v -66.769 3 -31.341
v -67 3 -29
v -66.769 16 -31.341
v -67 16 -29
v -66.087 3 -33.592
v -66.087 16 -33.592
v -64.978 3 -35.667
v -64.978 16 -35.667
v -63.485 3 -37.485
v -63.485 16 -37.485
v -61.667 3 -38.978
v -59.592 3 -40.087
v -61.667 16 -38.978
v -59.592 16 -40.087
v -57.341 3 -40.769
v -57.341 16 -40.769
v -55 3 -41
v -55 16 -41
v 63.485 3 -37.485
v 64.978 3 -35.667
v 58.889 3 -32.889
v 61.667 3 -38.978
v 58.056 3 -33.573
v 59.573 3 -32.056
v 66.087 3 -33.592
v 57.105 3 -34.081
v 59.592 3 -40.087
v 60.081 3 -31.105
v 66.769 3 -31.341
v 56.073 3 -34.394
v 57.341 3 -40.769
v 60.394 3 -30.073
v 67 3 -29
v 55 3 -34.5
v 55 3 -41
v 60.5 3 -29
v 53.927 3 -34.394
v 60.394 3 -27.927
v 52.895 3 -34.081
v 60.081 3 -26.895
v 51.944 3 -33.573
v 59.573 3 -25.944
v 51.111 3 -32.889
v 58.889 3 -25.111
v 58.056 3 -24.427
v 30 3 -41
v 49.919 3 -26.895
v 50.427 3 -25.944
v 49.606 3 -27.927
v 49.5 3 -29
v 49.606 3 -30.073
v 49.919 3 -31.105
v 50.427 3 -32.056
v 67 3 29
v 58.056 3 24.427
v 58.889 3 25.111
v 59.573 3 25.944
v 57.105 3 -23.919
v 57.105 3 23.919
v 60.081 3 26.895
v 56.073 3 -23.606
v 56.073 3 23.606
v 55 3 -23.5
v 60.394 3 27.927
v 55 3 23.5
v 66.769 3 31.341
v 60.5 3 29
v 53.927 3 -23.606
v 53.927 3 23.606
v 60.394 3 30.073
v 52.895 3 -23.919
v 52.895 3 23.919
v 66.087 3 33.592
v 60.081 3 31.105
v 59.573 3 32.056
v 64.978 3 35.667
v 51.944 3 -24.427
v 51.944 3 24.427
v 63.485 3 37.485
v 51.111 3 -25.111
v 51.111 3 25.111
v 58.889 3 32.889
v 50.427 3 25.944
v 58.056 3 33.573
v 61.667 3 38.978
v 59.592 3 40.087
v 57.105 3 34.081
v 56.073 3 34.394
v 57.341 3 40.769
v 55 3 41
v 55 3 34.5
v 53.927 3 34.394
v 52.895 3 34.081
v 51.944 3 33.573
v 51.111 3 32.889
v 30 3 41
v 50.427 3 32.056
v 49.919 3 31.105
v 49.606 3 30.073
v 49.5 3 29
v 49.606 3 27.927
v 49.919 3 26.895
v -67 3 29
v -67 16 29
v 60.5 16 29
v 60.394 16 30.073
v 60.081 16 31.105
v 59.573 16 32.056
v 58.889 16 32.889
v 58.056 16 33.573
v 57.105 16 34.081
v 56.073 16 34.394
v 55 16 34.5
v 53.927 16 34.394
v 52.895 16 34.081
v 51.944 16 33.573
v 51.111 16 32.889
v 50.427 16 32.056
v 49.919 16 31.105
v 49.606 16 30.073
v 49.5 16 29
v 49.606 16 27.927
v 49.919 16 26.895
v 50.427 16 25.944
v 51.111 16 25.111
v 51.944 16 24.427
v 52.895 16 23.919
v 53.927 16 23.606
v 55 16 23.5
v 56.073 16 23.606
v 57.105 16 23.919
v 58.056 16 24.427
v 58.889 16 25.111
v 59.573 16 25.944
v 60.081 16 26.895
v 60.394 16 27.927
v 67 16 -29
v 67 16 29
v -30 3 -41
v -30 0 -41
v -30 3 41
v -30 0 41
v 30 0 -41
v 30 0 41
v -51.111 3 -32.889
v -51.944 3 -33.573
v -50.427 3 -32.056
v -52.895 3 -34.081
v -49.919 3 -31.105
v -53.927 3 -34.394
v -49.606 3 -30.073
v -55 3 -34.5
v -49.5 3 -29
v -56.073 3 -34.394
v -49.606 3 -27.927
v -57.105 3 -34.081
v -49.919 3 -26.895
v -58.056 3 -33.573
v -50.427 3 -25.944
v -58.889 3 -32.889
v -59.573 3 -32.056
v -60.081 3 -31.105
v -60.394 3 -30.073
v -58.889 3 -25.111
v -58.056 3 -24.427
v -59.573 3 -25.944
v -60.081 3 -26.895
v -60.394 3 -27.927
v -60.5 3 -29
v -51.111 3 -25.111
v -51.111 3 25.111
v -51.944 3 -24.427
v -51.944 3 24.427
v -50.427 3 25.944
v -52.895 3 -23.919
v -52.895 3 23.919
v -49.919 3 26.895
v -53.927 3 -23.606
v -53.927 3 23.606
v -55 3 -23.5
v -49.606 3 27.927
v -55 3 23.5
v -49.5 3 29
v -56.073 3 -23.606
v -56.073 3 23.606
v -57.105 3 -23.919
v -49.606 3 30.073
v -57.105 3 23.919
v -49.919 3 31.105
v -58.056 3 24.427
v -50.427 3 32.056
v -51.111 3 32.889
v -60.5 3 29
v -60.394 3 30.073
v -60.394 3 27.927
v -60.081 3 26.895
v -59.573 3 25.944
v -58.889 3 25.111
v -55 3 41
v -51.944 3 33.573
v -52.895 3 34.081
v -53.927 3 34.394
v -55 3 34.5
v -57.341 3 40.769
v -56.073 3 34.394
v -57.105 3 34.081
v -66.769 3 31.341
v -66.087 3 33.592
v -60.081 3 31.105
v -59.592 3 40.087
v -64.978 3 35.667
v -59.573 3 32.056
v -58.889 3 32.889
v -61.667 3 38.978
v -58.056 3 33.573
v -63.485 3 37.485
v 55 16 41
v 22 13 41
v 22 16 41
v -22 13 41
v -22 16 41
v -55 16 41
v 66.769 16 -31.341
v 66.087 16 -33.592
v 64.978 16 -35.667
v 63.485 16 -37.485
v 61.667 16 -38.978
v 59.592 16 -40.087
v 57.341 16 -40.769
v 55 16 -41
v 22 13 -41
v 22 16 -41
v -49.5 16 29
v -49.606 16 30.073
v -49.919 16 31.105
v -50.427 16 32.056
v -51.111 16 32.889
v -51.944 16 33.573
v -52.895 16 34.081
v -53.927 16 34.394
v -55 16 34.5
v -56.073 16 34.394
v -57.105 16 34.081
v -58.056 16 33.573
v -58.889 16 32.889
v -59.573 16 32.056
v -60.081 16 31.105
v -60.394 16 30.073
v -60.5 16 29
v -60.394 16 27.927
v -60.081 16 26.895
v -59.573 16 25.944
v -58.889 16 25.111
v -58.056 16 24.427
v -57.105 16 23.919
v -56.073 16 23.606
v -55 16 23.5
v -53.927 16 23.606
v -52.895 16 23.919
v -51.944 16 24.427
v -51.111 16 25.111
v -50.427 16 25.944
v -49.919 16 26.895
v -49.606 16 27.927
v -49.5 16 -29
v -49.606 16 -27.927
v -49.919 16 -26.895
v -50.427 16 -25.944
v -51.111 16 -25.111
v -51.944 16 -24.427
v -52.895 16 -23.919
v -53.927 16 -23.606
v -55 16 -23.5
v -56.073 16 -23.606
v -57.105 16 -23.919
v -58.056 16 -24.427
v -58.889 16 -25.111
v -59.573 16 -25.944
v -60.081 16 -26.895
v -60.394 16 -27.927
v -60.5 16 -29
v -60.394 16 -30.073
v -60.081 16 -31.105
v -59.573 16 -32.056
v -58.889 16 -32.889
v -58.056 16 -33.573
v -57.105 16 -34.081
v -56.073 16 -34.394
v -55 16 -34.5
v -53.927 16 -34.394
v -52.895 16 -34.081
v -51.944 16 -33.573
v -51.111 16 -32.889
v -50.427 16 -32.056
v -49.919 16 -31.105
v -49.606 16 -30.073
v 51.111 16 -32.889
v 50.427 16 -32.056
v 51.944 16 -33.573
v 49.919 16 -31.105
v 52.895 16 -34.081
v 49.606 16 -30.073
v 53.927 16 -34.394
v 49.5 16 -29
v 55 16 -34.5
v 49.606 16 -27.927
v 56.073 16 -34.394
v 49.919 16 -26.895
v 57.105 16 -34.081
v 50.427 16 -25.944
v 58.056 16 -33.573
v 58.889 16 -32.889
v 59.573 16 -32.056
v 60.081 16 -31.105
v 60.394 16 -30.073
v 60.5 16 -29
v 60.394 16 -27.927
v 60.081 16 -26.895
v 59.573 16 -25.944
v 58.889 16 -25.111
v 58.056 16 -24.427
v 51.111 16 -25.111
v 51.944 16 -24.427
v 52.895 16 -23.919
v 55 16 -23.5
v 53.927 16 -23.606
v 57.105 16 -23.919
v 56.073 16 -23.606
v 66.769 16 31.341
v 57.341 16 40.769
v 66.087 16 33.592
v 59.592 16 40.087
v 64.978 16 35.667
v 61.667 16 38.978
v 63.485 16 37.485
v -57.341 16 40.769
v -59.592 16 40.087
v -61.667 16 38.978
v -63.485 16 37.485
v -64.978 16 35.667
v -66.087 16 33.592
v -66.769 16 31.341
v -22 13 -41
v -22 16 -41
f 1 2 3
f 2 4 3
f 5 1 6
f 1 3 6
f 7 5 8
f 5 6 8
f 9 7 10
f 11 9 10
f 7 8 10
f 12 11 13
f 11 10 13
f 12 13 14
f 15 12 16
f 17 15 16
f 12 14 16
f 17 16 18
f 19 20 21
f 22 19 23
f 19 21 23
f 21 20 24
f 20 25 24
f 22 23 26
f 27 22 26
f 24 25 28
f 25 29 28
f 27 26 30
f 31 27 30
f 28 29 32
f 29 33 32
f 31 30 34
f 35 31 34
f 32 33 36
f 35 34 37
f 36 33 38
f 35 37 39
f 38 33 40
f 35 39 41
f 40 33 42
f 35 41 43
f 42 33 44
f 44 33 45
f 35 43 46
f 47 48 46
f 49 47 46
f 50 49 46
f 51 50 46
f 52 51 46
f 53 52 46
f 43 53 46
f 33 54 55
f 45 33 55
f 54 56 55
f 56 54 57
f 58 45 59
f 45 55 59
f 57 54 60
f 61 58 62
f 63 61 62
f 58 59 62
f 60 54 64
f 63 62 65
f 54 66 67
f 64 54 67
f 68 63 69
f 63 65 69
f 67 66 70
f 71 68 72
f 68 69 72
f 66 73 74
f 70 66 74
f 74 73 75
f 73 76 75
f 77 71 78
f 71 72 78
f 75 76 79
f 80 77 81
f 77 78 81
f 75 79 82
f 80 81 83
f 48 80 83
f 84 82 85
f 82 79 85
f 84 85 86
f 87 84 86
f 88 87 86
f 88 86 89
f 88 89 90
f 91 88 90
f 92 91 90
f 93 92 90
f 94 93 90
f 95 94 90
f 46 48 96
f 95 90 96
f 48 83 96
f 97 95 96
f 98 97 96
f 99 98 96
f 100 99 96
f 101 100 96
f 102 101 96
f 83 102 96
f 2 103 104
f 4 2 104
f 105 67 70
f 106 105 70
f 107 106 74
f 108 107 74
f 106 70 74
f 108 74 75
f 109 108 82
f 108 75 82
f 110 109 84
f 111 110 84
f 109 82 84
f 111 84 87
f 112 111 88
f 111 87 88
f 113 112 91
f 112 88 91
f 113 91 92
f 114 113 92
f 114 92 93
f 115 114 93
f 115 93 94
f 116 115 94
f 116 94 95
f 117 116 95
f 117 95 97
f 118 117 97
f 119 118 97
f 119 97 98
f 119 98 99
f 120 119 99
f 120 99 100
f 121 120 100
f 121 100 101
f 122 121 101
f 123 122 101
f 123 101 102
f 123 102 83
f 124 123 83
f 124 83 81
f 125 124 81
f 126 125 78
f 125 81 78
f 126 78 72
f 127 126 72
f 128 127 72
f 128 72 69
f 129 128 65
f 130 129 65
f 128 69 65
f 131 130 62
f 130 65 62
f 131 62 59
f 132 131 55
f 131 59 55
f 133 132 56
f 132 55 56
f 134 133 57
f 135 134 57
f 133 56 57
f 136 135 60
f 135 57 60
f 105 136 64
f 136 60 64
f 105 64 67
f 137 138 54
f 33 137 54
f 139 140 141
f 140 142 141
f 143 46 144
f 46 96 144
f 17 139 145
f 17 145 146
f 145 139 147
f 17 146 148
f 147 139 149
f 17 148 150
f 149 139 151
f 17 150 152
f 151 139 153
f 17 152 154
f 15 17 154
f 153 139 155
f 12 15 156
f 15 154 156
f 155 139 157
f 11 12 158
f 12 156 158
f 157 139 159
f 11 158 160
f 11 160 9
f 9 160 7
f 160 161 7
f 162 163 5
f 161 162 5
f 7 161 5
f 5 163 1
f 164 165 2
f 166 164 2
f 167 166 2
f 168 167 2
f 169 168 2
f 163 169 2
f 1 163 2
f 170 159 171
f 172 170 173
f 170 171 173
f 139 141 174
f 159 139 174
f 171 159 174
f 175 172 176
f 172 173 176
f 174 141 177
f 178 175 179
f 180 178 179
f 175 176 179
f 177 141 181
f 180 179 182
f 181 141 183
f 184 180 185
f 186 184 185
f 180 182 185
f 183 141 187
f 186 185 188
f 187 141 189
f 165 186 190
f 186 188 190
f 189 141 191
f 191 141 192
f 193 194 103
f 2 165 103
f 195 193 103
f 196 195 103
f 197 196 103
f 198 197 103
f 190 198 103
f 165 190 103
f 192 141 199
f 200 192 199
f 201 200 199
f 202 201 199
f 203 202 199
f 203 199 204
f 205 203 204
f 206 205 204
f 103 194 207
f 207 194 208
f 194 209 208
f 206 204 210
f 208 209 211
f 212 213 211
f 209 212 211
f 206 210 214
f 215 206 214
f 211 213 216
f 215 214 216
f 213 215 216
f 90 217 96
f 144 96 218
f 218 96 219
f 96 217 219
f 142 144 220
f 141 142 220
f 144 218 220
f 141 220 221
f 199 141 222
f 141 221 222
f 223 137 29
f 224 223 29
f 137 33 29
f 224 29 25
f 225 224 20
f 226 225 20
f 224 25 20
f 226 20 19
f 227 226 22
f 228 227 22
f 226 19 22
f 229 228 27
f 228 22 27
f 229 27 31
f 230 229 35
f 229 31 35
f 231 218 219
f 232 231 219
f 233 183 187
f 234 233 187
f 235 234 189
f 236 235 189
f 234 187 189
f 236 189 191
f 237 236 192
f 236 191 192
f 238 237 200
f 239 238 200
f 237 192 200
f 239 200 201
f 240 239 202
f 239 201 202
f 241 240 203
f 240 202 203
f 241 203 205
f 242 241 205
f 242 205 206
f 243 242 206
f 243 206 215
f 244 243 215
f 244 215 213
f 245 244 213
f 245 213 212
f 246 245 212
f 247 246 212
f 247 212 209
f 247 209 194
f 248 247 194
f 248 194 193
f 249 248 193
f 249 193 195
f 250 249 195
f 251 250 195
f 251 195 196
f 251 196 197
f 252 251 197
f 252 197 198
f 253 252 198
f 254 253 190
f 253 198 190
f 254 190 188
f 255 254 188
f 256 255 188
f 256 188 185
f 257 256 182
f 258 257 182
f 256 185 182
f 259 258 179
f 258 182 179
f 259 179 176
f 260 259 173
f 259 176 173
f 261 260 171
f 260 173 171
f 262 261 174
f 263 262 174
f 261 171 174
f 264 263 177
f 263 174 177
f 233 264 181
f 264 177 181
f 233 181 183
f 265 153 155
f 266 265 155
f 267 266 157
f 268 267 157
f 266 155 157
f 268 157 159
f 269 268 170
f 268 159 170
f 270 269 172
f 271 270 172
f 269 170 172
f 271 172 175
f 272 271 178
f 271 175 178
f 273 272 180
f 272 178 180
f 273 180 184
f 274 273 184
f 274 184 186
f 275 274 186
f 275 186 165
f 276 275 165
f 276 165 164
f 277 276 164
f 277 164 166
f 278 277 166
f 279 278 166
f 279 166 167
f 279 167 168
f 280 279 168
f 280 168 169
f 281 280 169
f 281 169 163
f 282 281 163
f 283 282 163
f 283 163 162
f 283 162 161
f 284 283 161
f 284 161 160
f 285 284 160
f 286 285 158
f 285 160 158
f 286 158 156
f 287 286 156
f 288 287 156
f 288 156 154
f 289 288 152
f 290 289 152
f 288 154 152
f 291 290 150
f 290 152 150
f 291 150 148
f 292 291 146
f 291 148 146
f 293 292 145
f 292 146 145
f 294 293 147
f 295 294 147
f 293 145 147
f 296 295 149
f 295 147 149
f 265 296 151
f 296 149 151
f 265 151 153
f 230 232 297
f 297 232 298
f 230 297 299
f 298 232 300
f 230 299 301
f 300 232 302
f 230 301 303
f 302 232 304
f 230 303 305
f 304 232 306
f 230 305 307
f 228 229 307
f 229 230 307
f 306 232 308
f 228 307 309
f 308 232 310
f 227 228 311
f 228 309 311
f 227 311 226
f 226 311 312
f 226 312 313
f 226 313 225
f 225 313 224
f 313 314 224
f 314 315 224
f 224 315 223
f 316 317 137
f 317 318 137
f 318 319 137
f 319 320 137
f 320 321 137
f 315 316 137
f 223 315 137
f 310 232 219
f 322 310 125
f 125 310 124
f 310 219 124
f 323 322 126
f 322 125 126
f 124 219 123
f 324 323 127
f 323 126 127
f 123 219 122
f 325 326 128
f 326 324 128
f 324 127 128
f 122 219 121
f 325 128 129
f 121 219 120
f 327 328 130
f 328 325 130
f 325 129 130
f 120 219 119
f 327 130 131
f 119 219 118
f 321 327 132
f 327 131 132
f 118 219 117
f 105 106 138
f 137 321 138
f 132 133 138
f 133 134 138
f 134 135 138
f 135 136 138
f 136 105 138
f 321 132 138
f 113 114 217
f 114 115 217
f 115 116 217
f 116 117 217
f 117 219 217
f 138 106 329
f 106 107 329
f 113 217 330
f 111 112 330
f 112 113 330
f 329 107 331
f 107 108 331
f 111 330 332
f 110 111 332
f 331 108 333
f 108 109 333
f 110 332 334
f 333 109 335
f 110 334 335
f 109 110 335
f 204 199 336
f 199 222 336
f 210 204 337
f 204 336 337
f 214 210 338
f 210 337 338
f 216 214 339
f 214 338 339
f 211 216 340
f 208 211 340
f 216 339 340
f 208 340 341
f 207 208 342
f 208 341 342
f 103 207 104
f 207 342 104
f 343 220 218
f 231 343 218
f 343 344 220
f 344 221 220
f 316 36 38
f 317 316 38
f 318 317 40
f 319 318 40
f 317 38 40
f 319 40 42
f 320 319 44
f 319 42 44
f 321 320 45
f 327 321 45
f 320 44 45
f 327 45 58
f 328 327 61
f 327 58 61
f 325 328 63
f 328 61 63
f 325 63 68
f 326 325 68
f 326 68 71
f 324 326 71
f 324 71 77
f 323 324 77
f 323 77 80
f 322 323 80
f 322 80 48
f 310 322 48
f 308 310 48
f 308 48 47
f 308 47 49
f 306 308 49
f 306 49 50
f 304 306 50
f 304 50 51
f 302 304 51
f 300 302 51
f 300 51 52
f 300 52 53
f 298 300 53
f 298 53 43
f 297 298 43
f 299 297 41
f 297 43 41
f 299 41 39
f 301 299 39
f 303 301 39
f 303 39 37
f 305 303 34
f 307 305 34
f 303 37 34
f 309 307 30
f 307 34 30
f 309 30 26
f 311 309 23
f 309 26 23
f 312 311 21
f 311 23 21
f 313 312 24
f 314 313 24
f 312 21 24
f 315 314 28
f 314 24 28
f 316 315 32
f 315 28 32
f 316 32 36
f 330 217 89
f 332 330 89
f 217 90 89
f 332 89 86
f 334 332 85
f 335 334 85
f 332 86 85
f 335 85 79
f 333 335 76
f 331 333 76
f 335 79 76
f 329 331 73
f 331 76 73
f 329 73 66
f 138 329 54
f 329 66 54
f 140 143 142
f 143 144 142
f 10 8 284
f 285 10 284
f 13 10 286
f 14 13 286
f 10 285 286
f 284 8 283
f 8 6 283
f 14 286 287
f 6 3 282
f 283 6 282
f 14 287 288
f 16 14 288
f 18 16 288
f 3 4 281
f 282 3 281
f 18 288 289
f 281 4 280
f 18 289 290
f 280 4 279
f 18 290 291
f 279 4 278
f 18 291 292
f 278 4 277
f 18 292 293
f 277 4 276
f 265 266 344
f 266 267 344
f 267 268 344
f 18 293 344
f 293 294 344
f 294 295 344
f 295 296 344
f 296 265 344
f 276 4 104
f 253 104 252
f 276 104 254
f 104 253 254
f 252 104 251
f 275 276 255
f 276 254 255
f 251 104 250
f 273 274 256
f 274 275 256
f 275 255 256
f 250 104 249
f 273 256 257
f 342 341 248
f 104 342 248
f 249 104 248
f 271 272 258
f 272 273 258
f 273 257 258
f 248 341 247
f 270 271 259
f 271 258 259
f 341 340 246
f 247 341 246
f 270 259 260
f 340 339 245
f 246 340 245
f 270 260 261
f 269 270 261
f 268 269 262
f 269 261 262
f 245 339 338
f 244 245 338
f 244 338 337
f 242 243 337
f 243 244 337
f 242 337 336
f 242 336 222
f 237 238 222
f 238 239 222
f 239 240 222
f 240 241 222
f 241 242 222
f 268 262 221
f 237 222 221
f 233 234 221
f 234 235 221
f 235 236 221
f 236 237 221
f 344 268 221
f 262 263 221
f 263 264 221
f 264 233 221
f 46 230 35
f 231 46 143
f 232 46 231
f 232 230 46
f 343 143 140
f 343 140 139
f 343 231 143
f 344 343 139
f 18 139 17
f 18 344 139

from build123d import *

# Parameters (mm, degrees)
EXTRUSION1_DEPTH   = 41
CONG_1_R           = 12
D_GAGEMENT_M1_61_D = 11


with BuildPart() as part:
    # Esquisse1 → Extrusion1 (new, symmetric)
    with BuildSketch(Plane.XY):
        Polygon((22, 16), (67, 16), (67, 3), (30, 3), (30, 0), (-30, 0), (-30, 3), (-67, 3), (-67, 16), (-22, 16), (-22, 13), (22, 13), align=None)
    extrude(amount=EXTRUSION1_DEPTH, both=True)

    # Congé1
    cong_1_edges = [part.edges().sort_by_distance(p)[0] for p in [
        (67, 9.5, -41),
        (-67, 9.5, -41),
        (67, 9.5, 41),
        (-67, 9.5, 41),
    ]]
    fillet(cong_1_edges, radius=CONG_1_R)

    # Dégagement M1.61 (through all)
    with Locations(Plane(origin=(0, 16, 0), x_dir=(-1, 0, 0), z_dir=(0, 1, 0))):
        with Locations((55, 29), (55, -29), (-55, -29), (-55, 29)):
            Hole(D_GAGEMENT_M1_61_D / 2)


solid = part.part
